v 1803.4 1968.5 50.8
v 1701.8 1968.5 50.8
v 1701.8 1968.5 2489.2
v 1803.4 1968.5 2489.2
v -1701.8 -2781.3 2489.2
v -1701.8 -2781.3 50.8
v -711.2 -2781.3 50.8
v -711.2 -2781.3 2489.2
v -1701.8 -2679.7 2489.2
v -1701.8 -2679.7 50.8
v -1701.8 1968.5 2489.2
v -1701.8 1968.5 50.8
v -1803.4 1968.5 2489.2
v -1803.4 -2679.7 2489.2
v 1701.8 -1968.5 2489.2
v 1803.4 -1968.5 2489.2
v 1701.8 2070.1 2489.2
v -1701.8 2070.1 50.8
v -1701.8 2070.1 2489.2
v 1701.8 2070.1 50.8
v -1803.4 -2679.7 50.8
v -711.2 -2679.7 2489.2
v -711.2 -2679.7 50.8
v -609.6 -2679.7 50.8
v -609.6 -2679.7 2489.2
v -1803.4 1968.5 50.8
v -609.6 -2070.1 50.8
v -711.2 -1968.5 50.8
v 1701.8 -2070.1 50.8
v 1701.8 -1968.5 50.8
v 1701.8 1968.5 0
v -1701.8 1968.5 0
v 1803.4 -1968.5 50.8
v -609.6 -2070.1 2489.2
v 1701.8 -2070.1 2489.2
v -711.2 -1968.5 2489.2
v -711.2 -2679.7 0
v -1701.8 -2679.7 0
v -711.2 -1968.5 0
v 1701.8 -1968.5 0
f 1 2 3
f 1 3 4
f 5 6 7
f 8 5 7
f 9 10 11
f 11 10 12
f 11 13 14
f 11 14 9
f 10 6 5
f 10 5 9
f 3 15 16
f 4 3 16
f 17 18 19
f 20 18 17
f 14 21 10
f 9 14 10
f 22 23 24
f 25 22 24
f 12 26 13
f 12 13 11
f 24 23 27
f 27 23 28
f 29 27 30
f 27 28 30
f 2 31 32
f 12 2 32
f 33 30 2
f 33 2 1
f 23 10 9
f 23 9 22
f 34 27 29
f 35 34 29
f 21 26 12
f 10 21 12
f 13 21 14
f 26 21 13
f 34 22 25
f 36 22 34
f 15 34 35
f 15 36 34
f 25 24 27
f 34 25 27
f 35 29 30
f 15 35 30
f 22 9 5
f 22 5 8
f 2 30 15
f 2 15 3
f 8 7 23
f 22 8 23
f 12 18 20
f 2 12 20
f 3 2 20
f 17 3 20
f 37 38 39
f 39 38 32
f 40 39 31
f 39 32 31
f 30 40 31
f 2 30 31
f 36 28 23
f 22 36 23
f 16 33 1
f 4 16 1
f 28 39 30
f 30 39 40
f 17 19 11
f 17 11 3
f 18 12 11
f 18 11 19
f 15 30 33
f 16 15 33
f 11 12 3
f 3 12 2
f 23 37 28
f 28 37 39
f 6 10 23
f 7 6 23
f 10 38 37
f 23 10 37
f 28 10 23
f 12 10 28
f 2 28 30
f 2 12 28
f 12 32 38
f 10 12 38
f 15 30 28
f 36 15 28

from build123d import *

# Parameters (mm, degrees)
F0_W     = 990.6
F0_H     = 711.2
F1_DEPTH = 50.8
F2_W     = 3403.6
F2_H     = 101.6
F2_W_2   = 990.6
F2_W_3   = 2311.4
F2_W_4   = 101.6
F2_H_2   = 3937
F2_H_3   = 4648.2
F3_DEPTH = 2438.4


with BuildPart() as f1:
    # F0 (on Top) → F1 (new body)
    with BuildSketch(Plane.XY):
        Polygon((1701.8, -1968.5), (1701.8, 1968.5), (-1701.8, 1968.5), (-1701.8, -1968.5), (-711.2, -1968.5), align=None)
        with Locations((-1206.5, -2324.1)):
            Rectangle(F0_W, F0_H)
    extrude(amount=F1_DEPTH)


with BuildPart() as f3:
    # F2 (on face) → F3 (new body)
    with BuildSketch(Plane.XY.offset(50.8)):
        with Locations((0, 2019.3)):
            Rectangle(F2_W, F2_H)
        with Locations((-1206.5, -2730.5)):
            Rectangle(F2_W_2, F2_H)
        Polygon((-609.6, -2070.1), (-609.6, -1968.5), (-711.2, -1968.5), (-711.2, -2679.7), (-609.6, -2679.7), align=None)
        with Locations((546.1, -2019.3)):
            Rectangle(F2_W_3, F2_H)
        with Locations((1752.6, 0)):
            Rectangle(F2_W_4, F2_H_2)
        with Locations((-1752.6, -355.6)):
            Rectangle(F2_W_4, F2_H_3)
    extrude(amount=F3_DEPTH)


solid = Compound([f1.part, f3.part])
